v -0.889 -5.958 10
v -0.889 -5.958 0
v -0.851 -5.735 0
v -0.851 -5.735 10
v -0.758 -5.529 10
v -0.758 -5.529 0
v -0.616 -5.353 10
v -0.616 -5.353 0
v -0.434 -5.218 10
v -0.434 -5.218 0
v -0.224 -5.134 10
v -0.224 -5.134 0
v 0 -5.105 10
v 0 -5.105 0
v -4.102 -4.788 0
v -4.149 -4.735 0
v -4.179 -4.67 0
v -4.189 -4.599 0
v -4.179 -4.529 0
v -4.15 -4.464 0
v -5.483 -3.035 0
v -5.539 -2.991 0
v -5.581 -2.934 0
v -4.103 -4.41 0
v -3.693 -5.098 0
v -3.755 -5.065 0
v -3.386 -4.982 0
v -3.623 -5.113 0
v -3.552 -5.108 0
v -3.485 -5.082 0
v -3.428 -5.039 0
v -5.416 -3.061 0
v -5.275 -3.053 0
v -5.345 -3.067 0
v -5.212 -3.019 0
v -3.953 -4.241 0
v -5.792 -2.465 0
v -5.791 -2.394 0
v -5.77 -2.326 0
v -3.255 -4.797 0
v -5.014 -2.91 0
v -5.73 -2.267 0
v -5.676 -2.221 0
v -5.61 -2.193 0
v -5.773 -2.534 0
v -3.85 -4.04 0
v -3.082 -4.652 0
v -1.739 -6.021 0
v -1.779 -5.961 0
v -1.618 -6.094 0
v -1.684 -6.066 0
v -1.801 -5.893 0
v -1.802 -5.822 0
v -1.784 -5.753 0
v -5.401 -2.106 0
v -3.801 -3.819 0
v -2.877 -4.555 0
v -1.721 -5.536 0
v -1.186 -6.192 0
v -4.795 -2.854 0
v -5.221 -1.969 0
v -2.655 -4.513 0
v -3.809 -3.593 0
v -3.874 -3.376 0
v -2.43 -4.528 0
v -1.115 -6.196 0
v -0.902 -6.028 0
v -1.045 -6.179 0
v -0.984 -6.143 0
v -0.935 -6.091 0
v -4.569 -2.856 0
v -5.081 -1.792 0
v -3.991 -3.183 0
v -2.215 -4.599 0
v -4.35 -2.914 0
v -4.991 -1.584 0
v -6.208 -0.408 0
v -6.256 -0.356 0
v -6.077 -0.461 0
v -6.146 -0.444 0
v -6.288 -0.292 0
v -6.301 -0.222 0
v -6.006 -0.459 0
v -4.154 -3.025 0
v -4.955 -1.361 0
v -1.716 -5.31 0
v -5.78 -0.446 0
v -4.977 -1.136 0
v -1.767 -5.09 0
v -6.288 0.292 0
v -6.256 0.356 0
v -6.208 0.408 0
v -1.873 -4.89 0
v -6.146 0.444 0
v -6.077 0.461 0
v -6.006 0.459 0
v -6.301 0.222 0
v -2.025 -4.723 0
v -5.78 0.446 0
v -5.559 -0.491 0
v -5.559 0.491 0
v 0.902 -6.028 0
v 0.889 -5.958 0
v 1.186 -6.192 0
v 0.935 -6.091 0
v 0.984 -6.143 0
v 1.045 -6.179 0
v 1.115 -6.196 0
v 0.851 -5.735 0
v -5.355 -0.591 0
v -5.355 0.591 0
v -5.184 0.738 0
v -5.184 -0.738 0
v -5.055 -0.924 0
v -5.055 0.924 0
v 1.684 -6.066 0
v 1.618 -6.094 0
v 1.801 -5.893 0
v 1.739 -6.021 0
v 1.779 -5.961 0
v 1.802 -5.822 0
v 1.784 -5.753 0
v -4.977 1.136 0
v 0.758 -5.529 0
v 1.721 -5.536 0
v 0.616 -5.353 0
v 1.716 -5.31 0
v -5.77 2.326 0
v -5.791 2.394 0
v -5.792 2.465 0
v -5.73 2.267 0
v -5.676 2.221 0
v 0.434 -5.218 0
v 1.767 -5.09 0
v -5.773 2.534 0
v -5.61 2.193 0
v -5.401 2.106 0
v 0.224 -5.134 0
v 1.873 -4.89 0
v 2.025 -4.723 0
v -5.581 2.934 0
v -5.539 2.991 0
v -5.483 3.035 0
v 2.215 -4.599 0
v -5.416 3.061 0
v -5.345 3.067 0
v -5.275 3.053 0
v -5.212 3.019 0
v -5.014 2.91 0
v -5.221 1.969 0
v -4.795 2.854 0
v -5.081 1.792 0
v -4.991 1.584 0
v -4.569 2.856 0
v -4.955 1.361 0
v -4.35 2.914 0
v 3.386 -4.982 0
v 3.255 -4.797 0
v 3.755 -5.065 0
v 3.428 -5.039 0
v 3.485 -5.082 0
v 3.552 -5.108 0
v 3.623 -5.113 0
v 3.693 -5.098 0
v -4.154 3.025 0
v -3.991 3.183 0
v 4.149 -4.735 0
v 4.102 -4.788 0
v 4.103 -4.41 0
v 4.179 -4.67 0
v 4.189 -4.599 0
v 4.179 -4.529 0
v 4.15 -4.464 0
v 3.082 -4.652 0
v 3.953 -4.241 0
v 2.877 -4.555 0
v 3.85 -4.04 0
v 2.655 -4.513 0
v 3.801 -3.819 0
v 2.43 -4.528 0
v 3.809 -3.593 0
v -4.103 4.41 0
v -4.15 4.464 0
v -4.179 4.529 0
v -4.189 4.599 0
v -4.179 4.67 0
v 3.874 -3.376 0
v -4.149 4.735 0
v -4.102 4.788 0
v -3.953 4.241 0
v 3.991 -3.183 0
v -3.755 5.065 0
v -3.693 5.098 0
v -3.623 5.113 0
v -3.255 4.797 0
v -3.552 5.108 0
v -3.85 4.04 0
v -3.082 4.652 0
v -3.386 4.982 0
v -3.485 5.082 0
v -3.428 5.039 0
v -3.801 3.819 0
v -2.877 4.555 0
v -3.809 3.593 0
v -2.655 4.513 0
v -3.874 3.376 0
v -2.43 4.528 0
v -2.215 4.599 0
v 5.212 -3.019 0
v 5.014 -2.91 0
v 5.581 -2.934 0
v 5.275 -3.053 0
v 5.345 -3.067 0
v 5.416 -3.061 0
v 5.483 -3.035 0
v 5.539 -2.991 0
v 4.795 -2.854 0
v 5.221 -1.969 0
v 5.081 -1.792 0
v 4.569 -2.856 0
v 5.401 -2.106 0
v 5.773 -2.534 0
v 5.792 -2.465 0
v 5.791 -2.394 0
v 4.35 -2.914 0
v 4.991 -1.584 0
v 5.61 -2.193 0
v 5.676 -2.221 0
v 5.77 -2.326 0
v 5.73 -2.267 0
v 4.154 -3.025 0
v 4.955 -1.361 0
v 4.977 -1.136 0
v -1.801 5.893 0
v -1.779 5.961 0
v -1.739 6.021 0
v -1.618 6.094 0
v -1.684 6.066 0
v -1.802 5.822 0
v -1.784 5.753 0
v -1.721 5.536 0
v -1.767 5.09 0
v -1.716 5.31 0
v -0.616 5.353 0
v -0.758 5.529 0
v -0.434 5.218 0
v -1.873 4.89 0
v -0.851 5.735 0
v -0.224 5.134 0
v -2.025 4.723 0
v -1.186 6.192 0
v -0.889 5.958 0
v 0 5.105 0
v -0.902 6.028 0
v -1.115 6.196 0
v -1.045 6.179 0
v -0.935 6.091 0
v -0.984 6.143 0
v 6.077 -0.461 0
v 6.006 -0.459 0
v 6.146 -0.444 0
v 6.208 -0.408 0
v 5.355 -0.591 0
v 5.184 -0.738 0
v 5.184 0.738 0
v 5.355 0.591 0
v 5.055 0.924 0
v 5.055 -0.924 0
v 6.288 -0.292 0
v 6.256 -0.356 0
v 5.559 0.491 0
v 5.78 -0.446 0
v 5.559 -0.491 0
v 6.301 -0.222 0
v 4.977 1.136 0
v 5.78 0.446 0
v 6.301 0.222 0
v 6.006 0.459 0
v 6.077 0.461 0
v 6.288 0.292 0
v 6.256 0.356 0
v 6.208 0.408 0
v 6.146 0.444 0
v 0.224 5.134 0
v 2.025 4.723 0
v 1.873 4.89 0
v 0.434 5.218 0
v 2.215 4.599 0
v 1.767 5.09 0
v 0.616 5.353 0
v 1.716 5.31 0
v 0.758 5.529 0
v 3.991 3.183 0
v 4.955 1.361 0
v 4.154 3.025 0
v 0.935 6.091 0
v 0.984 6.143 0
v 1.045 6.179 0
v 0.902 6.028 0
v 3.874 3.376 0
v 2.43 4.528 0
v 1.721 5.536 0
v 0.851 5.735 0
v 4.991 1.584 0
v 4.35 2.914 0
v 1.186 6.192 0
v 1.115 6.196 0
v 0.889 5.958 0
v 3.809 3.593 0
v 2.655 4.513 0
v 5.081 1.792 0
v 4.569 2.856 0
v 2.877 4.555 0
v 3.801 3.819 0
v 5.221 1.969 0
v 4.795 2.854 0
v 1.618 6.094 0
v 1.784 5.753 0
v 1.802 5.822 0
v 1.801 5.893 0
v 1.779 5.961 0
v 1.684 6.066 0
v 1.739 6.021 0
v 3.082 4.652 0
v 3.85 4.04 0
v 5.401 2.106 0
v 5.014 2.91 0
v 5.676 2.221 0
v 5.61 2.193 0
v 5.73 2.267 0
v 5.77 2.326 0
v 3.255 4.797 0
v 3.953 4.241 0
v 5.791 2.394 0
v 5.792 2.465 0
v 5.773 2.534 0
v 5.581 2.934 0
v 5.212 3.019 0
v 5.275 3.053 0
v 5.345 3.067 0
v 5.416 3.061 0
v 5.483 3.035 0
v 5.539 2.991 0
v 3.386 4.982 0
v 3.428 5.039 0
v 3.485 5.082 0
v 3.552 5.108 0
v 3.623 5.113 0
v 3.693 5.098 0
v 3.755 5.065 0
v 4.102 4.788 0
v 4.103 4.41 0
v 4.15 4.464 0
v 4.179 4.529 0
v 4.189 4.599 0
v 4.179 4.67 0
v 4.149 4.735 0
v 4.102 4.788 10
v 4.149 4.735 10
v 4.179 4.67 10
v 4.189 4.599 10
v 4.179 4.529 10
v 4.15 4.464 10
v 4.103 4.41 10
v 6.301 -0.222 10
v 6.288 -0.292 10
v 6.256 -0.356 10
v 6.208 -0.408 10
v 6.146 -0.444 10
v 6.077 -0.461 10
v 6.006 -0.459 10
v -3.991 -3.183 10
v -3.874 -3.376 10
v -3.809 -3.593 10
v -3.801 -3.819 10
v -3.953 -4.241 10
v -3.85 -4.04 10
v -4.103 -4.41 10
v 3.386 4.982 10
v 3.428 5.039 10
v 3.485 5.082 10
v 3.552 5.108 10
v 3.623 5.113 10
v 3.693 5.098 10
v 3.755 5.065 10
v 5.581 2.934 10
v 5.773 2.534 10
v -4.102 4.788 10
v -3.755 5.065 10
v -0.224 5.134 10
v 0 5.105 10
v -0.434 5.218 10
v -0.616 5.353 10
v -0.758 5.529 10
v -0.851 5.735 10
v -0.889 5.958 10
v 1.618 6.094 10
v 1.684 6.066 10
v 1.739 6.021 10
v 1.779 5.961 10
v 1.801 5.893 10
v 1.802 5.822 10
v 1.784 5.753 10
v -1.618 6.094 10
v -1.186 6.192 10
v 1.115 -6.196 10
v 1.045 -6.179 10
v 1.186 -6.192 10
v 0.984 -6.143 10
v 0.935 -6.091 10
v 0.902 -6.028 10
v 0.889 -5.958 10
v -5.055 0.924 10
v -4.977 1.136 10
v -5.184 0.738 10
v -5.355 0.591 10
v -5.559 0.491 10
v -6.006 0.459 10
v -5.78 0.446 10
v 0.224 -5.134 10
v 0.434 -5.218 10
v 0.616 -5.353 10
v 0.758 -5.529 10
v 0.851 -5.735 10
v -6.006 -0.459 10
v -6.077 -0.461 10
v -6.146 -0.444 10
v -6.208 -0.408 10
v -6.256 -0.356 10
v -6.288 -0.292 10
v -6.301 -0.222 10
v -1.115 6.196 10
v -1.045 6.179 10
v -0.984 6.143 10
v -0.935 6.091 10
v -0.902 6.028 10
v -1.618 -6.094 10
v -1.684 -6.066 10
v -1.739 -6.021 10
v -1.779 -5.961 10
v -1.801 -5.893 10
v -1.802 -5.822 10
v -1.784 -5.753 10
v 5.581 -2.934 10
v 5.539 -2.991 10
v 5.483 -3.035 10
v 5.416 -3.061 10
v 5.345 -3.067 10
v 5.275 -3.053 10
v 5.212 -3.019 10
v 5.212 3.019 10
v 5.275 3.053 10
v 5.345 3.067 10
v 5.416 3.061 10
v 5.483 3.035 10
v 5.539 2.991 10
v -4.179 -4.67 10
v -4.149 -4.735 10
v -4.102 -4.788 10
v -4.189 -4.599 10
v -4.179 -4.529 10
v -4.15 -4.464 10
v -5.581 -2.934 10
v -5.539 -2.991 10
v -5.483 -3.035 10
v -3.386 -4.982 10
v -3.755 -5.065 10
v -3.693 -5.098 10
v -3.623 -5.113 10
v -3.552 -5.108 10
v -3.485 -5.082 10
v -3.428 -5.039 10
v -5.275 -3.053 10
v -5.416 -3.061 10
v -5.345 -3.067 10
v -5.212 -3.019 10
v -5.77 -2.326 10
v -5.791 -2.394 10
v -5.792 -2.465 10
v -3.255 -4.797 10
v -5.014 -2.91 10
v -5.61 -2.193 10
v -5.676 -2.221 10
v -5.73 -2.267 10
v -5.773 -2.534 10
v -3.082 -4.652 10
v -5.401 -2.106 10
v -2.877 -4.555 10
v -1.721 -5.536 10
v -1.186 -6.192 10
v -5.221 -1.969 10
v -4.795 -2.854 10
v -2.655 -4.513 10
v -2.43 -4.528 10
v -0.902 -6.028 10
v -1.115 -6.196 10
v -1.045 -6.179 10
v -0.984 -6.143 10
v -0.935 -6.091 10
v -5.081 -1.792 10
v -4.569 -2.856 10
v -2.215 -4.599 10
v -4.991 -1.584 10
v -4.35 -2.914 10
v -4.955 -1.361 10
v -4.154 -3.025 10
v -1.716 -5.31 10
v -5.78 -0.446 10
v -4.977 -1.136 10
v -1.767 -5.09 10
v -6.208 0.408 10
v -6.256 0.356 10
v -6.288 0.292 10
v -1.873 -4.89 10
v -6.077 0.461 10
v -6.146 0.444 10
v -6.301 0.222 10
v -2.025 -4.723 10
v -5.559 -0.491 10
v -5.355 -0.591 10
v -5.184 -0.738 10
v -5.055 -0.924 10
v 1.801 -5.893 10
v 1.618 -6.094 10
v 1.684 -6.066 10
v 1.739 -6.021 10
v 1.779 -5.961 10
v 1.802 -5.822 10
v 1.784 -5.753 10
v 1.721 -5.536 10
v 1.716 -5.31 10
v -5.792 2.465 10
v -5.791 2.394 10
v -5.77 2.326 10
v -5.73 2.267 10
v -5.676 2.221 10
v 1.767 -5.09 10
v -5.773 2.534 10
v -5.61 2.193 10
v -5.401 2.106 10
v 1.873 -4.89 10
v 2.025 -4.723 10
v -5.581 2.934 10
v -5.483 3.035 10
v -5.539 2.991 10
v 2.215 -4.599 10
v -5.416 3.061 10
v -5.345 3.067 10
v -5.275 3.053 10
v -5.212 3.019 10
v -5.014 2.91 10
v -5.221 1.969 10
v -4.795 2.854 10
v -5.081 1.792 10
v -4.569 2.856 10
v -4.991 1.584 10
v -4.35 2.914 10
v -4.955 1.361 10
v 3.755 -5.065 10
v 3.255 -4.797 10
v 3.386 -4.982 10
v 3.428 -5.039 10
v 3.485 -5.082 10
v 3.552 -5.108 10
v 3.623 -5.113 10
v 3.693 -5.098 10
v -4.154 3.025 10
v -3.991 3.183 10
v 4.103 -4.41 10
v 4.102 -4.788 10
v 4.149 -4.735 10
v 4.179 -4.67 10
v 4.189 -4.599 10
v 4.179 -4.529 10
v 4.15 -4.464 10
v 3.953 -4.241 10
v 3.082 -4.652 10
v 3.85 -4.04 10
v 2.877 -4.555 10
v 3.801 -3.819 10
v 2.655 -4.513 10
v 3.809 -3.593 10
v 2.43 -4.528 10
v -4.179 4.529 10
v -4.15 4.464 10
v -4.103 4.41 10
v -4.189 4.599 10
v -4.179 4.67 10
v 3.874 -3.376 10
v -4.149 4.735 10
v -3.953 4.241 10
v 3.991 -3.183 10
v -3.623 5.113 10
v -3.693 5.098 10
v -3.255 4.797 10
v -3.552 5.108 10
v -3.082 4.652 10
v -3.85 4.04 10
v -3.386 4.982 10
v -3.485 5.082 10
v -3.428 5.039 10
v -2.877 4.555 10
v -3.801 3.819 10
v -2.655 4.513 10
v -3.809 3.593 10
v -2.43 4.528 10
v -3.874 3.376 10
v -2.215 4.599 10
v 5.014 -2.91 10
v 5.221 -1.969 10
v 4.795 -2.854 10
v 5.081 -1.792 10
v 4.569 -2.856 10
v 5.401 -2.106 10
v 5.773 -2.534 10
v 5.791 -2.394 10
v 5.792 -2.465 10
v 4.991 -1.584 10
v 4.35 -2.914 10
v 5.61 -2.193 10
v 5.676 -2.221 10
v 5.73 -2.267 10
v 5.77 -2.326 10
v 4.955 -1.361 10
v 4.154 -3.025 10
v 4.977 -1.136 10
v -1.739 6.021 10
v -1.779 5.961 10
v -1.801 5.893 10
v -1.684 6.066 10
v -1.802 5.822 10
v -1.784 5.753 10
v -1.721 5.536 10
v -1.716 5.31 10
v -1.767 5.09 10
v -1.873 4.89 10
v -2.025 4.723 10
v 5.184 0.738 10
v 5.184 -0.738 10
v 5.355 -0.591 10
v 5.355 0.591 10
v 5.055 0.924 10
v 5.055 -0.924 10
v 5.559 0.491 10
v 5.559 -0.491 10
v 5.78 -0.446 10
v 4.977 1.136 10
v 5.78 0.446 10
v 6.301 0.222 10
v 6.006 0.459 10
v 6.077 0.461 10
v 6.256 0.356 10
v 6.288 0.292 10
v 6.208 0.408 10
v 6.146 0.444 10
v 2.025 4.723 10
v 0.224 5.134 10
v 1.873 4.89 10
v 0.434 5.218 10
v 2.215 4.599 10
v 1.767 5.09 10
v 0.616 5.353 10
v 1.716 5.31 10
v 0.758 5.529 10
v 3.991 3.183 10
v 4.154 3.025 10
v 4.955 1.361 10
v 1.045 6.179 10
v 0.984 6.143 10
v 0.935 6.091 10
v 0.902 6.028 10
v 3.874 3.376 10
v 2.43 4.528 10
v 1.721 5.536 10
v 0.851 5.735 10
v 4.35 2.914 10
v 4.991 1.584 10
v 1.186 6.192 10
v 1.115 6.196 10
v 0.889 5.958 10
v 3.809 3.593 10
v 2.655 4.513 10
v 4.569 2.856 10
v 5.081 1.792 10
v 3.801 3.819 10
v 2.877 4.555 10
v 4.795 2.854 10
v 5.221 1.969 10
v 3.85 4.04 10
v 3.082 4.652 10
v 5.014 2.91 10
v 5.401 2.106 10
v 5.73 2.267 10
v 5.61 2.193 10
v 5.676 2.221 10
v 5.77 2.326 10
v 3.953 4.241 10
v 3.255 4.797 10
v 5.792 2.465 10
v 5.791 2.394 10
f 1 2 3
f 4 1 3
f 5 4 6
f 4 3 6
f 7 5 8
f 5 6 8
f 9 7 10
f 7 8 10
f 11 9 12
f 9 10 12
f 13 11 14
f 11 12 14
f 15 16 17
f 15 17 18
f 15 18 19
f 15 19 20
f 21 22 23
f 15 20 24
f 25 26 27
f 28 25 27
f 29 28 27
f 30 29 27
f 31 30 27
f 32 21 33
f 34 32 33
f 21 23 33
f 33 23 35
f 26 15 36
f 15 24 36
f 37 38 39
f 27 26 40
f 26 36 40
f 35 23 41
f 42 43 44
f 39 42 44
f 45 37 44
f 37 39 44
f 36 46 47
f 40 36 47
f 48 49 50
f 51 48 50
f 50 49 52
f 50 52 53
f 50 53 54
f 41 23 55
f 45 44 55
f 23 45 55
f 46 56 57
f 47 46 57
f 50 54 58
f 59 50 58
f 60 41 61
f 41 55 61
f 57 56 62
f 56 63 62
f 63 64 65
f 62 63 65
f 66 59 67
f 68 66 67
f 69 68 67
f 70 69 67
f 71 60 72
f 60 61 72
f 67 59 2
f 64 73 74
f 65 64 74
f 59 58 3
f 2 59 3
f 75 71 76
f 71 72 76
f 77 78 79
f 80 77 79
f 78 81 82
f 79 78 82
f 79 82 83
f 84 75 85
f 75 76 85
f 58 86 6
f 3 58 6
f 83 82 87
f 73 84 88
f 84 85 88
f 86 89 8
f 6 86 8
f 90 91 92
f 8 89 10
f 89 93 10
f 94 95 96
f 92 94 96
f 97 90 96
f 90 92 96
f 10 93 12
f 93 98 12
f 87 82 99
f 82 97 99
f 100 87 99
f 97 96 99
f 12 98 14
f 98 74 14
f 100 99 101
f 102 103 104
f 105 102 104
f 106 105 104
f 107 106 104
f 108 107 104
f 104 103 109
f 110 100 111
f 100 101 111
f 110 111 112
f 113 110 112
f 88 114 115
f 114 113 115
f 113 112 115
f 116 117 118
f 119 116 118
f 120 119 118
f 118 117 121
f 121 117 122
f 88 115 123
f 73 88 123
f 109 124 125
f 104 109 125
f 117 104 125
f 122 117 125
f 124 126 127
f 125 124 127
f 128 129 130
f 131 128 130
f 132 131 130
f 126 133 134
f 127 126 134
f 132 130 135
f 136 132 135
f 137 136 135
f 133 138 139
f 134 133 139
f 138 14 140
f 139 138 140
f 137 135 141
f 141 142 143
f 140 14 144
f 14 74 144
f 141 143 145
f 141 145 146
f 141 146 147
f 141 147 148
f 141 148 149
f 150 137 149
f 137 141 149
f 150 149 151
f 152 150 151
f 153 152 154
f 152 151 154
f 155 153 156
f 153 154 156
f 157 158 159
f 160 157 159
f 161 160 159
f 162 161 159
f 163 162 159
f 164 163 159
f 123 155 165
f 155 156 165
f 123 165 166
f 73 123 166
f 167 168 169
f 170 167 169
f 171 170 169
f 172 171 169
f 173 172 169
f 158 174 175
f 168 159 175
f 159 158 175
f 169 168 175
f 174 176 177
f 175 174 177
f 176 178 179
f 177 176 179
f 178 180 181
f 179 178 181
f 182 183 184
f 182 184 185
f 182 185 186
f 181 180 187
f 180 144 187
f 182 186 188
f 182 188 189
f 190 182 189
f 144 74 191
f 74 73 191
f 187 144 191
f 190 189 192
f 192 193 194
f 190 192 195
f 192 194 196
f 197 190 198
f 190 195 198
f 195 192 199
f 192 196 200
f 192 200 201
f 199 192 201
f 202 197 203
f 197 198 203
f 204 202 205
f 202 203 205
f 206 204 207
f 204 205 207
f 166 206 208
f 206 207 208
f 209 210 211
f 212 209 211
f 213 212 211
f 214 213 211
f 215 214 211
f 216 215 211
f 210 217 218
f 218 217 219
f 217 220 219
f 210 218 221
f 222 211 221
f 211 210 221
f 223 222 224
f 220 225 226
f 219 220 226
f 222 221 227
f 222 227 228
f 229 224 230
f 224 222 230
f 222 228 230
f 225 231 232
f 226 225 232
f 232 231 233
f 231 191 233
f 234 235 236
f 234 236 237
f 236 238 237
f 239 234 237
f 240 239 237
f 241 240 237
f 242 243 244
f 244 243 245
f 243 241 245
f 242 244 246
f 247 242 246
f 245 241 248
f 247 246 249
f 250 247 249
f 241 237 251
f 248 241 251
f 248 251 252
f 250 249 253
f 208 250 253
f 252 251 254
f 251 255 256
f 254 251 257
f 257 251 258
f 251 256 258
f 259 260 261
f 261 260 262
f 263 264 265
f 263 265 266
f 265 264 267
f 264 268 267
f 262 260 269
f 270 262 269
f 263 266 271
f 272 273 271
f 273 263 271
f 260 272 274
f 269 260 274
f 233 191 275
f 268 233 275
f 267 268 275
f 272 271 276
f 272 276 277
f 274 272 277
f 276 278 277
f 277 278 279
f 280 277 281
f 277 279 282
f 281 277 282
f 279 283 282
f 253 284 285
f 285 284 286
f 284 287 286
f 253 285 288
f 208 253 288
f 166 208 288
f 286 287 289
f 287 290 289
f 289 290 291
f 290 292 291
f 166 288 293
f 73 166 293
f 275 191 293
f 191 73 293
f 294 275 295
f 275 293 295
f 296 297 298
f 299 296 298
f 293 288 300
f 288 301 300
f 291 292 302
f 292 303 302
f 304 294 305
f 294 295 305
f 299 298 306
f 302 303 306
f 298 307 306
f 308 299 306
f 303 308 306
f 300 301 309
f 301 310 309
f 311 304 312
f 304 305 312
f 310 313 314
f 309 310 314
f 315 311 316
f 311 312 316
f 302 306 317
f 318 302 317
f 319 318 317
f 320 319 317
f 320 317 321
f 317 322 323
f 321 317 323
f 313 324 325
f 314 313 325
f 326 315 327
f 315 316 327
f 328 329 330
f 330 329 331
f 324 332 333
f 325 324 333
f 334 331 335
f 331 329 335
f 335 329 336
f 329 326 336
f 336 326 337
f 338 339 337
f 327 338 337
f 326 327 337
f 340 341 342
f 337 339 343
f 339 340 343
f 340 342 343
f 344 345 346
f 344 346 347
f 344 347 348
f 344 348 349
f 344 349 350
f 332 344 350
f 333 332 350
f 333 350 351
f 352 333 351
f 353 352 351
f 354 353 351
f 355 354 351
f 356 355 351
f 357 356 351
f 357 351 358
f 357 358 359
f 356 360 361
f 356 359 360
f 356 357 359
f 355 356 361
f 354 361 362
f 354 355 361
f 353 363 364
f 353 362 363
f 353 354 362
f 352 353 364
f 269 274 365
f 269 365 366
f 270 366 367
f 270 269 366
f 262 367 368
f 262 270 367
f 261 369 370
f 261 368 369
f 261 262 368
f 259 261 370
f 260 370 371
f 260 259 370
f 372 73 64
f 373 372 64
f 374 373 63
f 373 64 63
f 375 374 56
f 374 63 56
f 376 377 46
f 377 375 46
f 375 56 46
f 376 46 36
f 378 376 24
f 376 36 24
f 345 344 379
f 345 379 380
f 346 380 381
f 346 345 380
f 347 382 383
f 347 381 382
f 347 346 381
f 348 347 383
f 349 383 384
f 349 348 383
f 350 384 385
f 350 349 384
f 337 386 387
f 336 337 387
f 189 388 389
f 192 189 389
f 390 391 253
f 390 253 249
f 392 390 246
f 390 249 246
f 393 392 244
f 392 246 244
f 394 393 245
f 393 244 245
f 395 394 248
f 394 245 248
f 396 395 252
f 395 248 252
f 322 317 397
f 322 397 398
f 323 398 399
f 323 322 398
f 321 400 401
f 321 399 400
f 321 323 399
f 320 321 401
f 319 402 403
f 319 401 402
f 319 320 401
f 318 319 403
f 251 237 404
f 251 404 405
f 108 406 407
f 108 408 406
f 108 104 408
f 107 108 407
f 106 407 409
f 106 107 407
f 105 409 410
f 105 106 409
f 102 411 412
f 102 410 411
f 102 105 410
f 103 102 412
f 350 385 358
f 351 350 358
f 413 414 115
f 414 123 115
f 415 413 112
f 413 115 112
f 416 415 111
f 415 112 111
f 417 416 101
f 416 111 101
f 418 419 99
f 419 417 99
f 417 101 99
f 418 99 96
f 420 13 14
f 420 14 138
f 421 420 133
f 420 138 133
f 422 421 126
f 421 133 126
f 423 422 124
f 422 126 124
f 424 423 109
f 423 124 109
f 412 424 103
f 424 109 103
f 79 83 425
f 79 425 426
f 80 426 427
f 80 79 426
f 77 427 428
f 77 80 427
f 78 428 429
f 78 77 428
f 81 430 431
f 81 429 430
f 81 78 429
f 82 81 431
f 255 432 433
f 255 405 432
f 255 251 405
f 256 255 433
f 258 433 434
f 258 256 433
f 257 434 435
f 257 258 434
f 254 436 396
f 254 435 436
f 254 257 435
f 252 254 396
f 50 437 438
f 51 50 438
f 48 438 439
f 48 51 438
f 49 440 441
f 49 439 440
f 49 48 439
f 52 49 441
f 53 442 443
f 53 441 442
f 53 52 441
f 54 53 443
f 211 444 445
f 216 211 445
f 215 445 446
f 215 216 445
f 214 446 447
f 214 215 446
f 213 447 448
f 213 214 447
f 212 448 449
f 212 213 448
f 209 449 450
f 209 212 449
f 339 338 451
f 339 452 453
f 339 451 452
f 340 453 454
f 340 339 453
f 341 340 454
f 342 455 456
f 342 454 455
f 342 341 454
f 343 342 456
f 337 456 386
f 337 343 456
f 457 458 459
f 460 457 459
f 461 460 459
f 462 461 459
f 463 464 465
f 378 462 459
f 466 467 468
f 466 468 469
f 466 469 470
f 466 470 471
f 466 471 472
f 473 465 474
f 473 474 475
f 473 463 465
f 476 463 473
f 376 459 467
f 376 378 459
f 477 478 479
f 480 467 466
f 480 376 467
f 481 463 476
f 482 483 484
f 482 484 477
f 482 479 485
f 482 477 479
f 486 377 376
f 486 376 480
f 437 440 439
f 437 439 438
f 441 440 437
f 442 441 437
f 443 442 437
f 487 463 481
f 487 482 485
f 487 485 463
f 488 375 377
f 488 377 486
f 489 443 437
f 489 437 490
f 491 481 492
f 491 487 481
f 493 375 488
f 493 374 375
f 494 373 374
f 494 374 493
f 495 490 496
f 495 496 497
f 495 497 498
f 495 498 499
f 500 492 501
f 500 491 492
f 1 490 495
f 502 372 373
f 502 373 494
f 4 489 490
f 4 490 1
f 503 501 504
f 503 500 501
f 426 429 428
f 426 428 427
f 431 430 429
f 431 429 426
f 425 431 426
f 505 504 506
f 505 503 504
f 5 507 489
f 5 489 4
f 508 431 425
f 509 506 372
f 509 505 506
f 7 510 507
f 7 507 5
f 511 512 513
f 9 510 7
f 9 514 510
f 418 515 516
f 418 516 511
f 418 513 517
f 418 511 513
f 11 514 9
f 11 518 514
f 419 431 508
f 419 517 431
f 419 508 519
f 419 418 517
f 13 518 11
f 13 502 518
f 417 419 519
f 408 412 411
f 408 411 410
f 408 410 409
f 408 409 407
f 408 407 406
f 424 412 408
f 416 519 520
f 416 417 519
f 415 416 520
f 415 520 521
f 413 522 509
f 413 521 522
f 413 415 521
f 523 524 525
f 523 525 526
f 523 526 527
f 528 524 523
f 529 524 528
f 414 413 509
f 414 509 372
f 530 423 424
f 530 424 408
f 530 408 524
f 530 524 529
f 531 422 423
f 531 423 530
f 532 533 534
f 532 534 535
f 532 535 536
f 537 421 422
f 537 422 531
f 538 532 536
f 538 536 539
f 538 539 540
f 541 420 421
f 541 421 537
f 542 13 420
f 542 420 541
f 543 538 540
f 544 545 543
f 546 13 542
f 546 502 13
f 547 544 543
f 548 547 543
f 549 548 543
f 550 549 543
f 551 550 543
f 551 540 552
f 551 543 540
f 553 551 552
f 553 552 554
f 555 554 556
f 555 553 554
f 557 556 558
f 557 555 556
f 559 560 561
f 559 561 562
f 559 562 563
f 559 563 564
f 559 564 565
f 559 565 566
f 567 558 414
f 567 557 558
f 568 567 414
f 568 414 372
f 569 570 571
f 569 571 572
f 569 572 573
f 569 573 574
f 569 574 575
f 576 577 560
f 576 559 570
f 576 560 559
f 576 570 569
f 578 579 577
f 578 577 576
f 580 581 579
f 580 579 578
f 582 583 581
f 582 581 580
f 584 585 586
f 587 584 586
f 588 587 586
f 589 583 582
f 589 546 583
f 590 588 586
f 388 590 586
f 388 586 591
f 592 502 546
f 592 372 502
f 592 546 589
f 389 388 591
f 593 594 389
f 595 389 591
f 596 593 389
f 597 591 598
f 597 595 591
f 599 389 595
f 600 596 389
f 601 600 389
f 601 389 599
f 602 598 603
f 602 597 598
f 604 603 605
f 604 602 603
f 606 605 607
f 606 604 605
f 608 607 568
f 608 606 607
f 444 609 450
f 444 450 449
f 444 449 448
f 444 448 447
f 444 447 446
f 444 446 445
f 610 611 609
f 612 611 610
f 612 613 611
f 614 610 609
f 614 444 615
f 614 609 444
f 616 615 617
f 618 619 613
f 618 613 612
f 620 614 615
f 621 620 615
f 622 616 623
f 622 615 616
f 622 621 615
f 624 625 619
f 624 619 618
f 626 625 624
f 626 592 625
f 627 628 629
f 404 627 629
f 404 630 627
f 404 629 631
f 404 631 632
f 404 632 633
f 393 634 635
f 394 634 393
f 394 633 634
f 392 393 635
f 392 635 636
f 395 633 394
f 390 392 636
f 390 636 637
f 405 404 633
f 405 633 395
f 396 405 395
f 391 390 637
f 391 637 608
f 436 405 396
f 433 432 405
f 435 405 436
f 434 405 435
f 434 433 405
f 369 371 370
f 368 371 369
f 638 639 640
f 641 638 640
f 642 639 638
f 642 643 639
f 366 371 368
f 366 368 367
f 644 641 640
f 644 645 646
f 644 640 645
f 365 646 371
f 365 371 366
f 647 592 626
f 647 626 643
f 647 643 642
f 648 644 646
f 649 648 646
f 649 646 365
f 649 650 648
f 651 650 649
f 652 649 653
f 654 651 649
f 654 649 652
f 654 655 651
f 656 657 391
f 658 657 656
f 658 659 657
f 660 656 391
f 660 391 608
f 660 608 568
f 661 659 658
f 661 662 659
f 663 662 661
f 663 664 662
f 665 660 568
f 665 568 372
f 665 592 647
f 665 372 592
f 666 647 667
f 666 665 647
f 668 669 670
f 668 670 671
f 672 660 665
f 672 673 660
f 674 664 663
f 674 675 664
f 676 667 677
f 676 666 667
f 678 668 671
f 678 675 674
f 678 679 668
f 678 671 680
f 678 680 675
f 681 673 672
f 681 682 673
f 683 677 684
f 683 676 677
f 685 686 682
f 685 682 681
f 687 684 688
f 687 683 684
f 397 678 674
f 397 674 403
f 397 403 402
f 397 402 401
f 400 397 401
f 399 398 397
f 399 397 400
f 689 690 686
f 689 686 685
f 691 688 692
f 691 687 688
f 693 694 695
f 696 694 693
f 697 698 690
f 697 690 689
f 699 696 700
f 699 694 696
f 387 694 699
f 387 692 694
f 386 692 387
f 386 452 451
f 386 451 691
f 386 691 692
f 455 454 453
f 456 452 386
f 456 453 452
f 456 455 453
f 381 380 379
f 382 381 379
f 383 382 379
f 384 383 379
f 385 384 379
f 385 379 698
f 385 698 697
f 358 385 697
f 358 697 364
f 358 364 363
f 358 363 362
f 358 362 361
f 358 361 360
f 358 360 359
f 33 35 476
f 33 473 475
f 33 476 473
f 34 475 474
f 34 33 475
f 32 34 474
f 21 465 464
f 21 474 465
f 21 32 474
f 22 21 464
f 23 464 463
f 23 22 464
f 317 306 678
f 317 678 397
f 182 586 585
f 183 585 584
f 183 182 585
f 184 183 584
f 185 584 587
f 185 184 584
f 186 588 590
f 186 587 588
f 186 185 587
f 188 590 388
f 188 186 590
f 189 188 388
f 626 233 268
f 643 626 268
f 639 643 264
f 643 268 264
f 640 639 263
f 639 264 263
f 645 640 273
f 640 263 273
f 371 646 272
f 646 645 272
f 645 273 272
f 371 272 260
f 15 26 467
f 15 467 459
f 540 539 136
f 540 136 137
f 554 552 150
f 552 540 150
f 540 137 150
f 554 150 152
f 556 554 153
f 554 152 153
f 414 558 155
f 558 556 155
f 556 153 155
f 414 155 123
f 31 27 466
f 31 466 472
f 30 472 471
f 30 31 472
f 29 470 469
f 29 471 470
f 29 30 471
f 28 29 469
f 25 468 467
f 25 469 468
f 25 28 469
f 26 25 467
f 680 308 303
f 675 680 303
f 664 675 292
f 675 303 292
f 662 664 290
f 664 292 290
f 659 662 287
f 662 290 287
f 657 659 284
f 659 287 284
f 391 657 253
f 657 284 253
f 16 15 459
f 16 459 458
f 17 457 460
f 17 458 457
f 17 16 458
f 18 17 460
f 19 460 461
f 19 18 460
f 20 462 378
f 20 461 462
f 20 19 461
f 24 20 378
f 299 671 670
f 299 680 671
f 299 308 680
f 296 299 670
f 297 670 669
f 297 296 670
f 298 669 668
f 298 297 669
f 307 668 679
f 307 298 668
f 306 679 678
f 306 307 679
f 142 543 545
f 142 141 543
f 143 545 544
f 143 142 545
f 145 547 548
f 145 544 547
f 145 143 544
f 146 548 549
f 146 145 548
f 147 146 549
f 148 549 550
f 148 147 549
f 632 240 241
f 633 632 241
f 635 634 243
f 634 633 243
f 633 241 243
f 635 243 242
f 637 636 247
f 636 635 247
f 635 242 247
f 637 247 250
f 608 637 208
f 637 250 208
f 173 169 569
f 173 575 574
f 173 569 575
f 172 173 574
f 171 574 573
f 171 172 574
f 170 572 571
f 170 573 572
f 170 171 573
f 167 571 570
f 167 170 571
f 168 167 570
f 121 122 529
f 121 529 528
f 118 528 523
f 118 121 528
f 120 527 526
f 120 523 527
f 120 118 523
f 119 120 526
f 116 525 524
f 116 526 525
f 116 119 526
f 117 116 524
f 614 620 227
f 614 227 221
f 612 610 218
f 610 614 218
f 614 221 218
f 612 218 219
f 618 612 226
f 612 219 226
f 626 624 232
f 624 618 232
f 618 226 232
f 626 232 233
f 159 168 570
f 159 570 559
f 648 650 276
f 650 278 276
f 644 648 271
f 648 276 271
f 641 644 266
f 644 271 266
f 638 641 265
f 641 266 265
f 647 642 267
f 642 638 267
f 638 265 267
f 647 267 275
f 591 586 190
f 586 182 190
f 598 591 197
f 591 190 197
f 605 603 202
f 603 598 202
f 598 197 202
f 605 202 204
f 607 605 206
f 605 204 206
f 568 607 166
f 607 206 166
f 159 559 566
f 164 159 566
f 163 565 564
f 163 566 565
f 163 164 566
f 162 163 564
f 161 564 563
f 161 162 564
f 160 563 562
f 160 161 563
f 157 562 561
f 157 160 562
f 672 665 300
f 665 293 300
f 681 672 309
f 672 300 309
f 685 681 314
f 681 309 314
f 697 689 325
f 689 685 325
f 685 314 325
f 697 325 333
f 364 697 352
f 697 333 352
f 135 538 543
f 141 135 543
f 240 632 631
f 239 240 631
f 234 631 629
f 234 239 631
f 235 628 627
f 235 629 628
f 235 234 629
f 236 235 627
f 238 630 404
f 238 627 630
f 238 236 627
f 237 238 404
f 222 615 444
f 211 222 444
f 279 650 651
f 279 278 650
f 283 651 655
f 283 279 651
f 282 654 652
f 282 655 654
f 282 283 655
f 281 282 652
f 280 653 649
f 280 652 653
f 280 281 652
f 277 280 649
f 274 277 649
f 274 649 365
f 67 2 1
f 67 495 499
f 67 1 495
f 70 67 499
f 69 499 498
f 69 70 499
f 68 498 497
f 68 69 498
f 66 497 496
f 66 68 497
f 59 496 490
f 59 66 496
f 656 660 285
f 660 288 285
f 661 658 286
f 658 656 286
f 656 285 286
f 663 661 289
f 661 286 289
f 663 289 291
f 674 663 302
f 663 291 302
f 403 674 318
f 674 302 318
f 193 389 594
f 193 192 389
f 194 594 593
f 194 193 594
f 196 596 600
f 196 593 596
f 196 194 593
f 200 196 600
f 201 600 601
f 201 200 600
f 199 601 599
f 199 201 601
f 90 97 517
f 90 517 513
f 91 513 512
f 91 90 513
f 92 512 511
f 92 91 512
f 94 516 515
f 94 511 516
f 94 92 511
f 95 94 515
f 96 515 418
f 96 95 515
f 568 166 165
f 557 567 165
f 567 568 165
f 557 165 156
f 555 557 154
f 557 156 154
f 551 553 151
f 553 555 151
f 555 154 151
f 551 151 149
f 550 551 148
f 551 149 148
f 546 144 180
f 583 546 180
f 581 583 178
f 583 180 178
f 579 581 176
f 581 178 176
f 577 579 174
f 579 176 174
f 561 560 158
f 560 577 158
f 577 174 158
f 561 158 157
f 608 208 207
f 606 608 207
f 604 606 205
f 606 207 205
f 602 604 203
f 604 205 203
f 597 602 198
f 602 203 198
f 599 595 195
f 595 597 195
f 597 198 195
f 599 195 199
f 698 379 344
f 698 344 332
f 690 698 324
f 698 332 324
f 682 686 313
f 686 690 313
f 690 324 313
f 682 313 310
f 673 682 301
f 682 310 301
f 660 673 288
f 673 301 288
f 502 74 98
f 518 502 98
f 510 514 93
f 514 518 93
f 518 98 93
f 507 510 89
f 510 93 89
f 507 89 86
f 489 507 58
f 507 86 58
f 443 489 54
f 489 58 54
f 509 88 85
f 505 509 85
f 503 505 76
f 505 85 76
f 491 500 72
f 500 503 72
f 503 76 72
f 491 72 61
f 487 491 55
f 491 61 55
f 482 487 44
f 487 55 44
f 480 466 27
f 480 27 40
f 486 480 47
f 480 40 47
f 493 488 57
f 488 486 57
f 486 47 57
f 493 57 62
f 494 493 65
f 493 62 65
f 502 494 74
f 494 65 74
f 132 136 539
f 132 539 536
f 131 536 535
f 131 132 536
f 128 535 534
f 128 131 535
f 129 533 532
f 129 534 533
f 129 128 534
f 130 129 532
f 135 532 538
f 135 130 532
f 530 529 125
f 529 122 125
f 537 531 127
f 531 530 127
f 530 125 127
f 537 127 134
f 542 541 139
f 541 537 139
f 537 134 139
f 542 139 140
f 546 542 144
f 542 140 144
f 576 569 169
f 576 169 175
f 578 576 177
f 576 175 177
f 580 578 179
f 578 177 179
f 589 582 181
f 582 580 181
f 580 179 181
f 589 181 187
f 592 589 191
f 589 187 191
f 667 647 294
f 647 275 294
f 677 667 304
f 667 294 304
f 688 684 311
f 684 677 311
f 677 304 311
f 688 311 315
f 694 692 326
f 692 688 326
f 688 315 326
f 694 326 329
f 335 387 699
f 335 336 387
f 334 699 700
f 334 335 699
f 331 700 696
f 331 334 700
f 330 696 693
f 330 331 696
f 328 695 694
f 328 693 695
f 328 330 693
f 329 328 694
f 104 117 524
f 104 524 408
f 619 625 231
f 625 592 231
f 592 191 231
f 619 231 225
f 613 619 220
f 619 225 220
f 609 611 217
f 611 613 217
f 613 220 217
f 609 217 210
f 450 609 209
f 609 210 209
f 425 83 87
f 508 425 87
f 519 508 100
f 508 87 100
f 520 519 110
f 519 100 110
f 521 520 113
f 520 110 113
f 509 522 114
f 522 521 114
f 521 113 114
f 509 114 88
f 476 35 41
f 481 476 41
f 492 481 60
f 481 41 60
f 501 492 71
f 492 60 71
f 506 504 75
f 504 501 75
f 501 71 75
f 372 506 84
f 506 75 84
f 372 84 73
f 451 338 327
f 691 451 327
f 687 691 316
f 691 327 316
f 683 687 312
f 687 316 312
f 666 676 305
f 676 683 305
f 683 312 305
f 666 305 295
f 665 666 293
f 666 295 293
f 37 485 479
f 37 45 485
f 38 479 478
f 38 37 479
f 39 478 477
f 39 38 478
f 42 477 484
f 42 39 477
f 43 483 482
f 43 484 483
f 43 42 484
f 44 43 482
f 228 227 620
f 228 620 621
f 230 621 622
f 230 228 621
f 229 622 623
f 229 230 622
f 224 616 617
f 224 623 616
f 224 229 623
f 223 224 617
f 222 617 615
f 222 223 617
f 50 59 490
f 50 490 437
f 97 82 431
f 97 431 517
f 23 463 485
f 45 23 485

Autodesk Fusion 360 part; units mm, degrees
sketch "Sketch1" plane through (0, 0, 0) normal (0, 0, 1) x (1, 0, 0)
  circle A0 centre (0, 0) radius 6.305 construction
  circle A1 centre (0, 0) radius 5.105 construction
  line L0 (0, 0) -> (0, 5.105) construction
  circle A2 centre (0, 5.995) radius 0.89 construction
  circle A3 centre (1.139, 5.9469) radius 0.25 construction
  line L1 (0, 0) -> (2.7356, 5.6806) construction
  line L2 (0, 0) -> (6.305, 0) construction
  circle A4 centre (2.6011, 5.4013) radius 0.89 construction
  circle A5 centre (1.5541, 5.8522) radius 0.25 construction
  arc A6 (0.9079, 5.9375) -> (0.8892, 5.9575) centre (0, 5.105) ccw construction
  arc A7 (0, 5.105) -> (0.8892, 5.9575) centre (0, 5.995) ccw
  arc A8 (1.186, 6.1924) -> (0.8892, 5.9575) centre (1.139, 5.9469) ccw
  arc A9 (1.7837, 5.7533) -> (1.6182, 6.0938) centre (1.5541, 5.8522) ccw
  arc A10 (1.7837, 5.7533) -> (2.215, 4.5994) centre (2.6011, 5.4013) ccw
  line L3 (1.186, 6.1924) -> (1.6182, 6.0938)
  arc A11 (-0.8892, 5.9575) -> (0, 5.105) centre (0, 5.995) ccw
  arc A12 (-0.8892, 5.9575) -> (-1.186, 6.1924) centre (-1.139, 5.9469) ccw
  line L4 (-1.6182, 6.0938) -> (-1.186, 6.1924)
  arc A13 (-1.6182, 6.0938) -> (-1.7837, 5.7533) centre (-1.5541, 5.8522) ccw
  arc A14 (-2.215, 4.5994) -> (-1.7837, 5.7533) centre (-2.6011, 5.4013) ccw
  arc A15 (-3.386, 4.9817) -> (-2.215, 4.5994) centre (-2.6011, 5.4013) ccw
  arc A16 (-3.386, 4.9817) -> (-3.7554, 5.0646) centre (-3.6065, 4.8638) ccw
  line L5 (-4.102, 4.7882) -> (-3.7554, 5.0646)
  arc A17 (-4.102, 4.7882) -> (-4.1033, 4.4096) centre (-3.9393, 4.5983) ccw
  arc A18 (-3.9912, 3.1829) -> (-4.1033, 4.4096) centre (-4.6871, 3.7378) ccw
  arc A19 (-5.2121, 3.0192) -> (-3.9912, 3.1829) centre (-4.6871, 3.7378) ccw
  arc A20 (-5.2121, 3.0192) -> (-5.5809, 2.9337) centre (-5.3596, 2.8173) ccw
  line L6 (-5.7733, 2.5342) -> (-5.5809, 2.9337)
  arc A21 (-5.7733, 2.5342) -> (-5.6102, 2.1926) centre (-5.5444, 2.4337) ccw
  arc A22 (-4.977, 1.136) -> (-5.6102, 2.1926) centre (-5.8447, 1.334) ccw
  arc A23 (-6.006, 0.4587) -> (-4.977, 1.136) centre (-5.8447, 1.334) ccw
  arc A24 (-6.006, 0.4587) -> (-6.3011, 0.2217) centre (-6.0513, 0.2129) ccw
  line L7 (-6.3011, -0.2217) -> (-6.3011, 0.2217)
  arc A25 (-6.3011, -0.2217) -> (-6.006, -0.4587) centre (-6.0513, -0.2129) ccw
  arc A26 (-4.977, -1.136) -> (-6.006, -0.4587) centre (-5.8447, -1.334) ccw
  arc A27 (-5.6102, -2.1926) -> (-4.977, -1.136) centre (-5.8447, -1.334) ccw
  arc A28 (-5.6102, -2.1926) -> (-5.7733, -2.5342) centre (-5.5444, -2.4337) ccw
  line L8 (-5.5809, -2.9337) -> (-5.7733, -2.5342)
  arc A29 (-5.5809, -2.9337) -> (-5.2121, -3.0192) centre (-5.3596, -2.8173) ccw
  arc A30 (-3.9912, -3.1829) -> (-5.2121, -3.0192) centre (-4.6871, -3.7378) ccw
  arc A31 (-4.1033, -4.4096) -> (-3.9912, -3.1829) centre (-4.6871, -3.7378) ccw
  arc A32 (-4.1033, -4.4096) -> (-4.102, -4.7882) centre (-3.9393, -4.5983) ccw
  line L9 (-3.7554, -5.0646) -> (-4.102, -4.7882)
  arc A33 (-3.7554, -5.0646) -> (-3.386, -4.9817) centre (-3.6065, -4.8638) ccw
  arc A34 (-2.215, -4.5994) -> (-3.386, -4.9817) centre (-2.6011, -5.4013) ccw
  arc A35 (-1.7837, -5.7533) -> (-2.215, -4.5994) centre (-2.6011, -5.4013) ccw
  arc A36 (-1.7837, -5.7533) -> (-1.6182, -6.0938) centre (-1.5541, -5.8522) ccw
  line L10 (-1.186, -6.1924) -> (-1.6182, -6.0938)
  arc A37 (-1.186, -6.1924) -> (-0.8892, -5.9575) centre (-1.139, -5.9469) ccw
  arc A38 (0, -5.105) -> (-0.8892, -5.9575) centre (0, -5.995) ccw
  arc A39 (0.8892, -5.9575) -> (0, -5.105) centre (0, -5.995) ccw
  arc A40 (0.8892, -5.9575) -> (1.186, -6.1924) centre (1.139, -5.9469) ccw
  line L11 (1.6182, -6.0938) -> (1.186, -6.1924)
  arc A41 (1.6182, -6.0938) -> (1.7837, -5.7533) centre (1.5541, -5.8522) ccw
  arc A42 (2.215, -4.5994) -> (1.7837, -5.7533) centre (2.6011, -5.4013) ccw
  arc A43 (3.386, -4.9817) -> (2.215, -4.5994) centre (2.6011, -5.4013) ccw
  arc A44 (3.386, -4.9817) -> (3.7554, -5.0646) centre (3.6065, -4.8638) ccw
  line L12 (4.102, -4.7882) -> (3.7554, -5.0646)
  arc A45 (4.102, -4.7882) -> (4.1033, -4.4096) centre (3.9393, -4.5983) ccw
  arc A46 (3.9912, -3.1829) -> (4.1033, -4.4096) centre (4.6871, -3.7378) ccw
  arc A47 (5.2121, -3.0192) -> (3.9912, -3.1829) centre (4.6871, -3.7378) ccw
  arc A48 (5.2121, -3.0192) -> (5.5809, -2.9337) centre (5.3596, -2.8173) ccw
  line L13 (5.7733, -2.5342) -> (5.5809, -2.9337)
  arc A49 (5.7733, -2.5342) -> (5.6102, -2.1926) centre (5.5444, -2.4337) ccw
  arc A50 (4.977, -1.136) -> (5.6102, -2.1926) centre (5.8447, -1.334) ccw
  arc A51 (6.006, -0.4587) -> (4.977, -1.136) centre (5.8447, -1.334) ccw
  arc A52 (6.006, -0.4587) -> (6.3011, -0.2217) centre (6.0513, -0.2129) ccw
  line L14 (6.3011, 0.2217) -> (6.3011, -0.2217)
  arc A53 (6.3011, 0.2217) -> (6.006, 0.4587) centre (6.0513, 0.2129) ccw
  arc A54 (4.977, 1.136) -> (6.006, 0.4587) centre (5.8447, 1.334) ccw
  arc A55 (5.6102, 2.1926) -> (4.977, 1.136) centre (5.8447, 1.334) ccw
  arc A56 (5.6102, 2.1926) -> (5.7733, 2.5342) centre (5.5444, 2.4337) ccw
  line L15 (5.5809, 2.9337) -> (5.7733, 2.5342)
  arc A57 (5.5809, 2.9337) -> (5.2121, 3.0192) centre (5.3596, 2.8173) ccw
  arc A58 (3.9912, 3.1829) -> (5.2121, 3.0192) centre (4.6871, 3.7378) ccw
  arc A59 (4.1033, 4.4096) -> (3.9912, 3.1829) centre (4.6871, 3.7378) ccw
  arc A60 (4.1033, 4.4096) -> (4.102, 4.7882) centre (3.9393, 4.5983) ccw
  line L16 (3.7554, 5.0646) -> (4.102, 4.7882)
  arc A61 (3.7554, 5.0646) -> (3.386, 4.9817) centre (3.6065, 4.8638) ccw
  arc A62 (2.215, 4.5994) -> (3.386, 4.9817) centre (2.6011, 5.4013) ccw
  dimension "d1" = 12.61
  dimension "d2" = 10.21
  dimension "d3" = 1.78
  dimension "d4" = 0.5
  dimension "d6" = 25.714
  dimension "d7" = 1.78
  dimension "d8" = 0.5
  dimension "d10" = 360
extrude "Extrude1" add sketch "Sketch1" along normal blind 10
equation "d2 = d1 - ( ( 2 * 1.2 ) * 1 mm )"
equation "d7 = d3"
